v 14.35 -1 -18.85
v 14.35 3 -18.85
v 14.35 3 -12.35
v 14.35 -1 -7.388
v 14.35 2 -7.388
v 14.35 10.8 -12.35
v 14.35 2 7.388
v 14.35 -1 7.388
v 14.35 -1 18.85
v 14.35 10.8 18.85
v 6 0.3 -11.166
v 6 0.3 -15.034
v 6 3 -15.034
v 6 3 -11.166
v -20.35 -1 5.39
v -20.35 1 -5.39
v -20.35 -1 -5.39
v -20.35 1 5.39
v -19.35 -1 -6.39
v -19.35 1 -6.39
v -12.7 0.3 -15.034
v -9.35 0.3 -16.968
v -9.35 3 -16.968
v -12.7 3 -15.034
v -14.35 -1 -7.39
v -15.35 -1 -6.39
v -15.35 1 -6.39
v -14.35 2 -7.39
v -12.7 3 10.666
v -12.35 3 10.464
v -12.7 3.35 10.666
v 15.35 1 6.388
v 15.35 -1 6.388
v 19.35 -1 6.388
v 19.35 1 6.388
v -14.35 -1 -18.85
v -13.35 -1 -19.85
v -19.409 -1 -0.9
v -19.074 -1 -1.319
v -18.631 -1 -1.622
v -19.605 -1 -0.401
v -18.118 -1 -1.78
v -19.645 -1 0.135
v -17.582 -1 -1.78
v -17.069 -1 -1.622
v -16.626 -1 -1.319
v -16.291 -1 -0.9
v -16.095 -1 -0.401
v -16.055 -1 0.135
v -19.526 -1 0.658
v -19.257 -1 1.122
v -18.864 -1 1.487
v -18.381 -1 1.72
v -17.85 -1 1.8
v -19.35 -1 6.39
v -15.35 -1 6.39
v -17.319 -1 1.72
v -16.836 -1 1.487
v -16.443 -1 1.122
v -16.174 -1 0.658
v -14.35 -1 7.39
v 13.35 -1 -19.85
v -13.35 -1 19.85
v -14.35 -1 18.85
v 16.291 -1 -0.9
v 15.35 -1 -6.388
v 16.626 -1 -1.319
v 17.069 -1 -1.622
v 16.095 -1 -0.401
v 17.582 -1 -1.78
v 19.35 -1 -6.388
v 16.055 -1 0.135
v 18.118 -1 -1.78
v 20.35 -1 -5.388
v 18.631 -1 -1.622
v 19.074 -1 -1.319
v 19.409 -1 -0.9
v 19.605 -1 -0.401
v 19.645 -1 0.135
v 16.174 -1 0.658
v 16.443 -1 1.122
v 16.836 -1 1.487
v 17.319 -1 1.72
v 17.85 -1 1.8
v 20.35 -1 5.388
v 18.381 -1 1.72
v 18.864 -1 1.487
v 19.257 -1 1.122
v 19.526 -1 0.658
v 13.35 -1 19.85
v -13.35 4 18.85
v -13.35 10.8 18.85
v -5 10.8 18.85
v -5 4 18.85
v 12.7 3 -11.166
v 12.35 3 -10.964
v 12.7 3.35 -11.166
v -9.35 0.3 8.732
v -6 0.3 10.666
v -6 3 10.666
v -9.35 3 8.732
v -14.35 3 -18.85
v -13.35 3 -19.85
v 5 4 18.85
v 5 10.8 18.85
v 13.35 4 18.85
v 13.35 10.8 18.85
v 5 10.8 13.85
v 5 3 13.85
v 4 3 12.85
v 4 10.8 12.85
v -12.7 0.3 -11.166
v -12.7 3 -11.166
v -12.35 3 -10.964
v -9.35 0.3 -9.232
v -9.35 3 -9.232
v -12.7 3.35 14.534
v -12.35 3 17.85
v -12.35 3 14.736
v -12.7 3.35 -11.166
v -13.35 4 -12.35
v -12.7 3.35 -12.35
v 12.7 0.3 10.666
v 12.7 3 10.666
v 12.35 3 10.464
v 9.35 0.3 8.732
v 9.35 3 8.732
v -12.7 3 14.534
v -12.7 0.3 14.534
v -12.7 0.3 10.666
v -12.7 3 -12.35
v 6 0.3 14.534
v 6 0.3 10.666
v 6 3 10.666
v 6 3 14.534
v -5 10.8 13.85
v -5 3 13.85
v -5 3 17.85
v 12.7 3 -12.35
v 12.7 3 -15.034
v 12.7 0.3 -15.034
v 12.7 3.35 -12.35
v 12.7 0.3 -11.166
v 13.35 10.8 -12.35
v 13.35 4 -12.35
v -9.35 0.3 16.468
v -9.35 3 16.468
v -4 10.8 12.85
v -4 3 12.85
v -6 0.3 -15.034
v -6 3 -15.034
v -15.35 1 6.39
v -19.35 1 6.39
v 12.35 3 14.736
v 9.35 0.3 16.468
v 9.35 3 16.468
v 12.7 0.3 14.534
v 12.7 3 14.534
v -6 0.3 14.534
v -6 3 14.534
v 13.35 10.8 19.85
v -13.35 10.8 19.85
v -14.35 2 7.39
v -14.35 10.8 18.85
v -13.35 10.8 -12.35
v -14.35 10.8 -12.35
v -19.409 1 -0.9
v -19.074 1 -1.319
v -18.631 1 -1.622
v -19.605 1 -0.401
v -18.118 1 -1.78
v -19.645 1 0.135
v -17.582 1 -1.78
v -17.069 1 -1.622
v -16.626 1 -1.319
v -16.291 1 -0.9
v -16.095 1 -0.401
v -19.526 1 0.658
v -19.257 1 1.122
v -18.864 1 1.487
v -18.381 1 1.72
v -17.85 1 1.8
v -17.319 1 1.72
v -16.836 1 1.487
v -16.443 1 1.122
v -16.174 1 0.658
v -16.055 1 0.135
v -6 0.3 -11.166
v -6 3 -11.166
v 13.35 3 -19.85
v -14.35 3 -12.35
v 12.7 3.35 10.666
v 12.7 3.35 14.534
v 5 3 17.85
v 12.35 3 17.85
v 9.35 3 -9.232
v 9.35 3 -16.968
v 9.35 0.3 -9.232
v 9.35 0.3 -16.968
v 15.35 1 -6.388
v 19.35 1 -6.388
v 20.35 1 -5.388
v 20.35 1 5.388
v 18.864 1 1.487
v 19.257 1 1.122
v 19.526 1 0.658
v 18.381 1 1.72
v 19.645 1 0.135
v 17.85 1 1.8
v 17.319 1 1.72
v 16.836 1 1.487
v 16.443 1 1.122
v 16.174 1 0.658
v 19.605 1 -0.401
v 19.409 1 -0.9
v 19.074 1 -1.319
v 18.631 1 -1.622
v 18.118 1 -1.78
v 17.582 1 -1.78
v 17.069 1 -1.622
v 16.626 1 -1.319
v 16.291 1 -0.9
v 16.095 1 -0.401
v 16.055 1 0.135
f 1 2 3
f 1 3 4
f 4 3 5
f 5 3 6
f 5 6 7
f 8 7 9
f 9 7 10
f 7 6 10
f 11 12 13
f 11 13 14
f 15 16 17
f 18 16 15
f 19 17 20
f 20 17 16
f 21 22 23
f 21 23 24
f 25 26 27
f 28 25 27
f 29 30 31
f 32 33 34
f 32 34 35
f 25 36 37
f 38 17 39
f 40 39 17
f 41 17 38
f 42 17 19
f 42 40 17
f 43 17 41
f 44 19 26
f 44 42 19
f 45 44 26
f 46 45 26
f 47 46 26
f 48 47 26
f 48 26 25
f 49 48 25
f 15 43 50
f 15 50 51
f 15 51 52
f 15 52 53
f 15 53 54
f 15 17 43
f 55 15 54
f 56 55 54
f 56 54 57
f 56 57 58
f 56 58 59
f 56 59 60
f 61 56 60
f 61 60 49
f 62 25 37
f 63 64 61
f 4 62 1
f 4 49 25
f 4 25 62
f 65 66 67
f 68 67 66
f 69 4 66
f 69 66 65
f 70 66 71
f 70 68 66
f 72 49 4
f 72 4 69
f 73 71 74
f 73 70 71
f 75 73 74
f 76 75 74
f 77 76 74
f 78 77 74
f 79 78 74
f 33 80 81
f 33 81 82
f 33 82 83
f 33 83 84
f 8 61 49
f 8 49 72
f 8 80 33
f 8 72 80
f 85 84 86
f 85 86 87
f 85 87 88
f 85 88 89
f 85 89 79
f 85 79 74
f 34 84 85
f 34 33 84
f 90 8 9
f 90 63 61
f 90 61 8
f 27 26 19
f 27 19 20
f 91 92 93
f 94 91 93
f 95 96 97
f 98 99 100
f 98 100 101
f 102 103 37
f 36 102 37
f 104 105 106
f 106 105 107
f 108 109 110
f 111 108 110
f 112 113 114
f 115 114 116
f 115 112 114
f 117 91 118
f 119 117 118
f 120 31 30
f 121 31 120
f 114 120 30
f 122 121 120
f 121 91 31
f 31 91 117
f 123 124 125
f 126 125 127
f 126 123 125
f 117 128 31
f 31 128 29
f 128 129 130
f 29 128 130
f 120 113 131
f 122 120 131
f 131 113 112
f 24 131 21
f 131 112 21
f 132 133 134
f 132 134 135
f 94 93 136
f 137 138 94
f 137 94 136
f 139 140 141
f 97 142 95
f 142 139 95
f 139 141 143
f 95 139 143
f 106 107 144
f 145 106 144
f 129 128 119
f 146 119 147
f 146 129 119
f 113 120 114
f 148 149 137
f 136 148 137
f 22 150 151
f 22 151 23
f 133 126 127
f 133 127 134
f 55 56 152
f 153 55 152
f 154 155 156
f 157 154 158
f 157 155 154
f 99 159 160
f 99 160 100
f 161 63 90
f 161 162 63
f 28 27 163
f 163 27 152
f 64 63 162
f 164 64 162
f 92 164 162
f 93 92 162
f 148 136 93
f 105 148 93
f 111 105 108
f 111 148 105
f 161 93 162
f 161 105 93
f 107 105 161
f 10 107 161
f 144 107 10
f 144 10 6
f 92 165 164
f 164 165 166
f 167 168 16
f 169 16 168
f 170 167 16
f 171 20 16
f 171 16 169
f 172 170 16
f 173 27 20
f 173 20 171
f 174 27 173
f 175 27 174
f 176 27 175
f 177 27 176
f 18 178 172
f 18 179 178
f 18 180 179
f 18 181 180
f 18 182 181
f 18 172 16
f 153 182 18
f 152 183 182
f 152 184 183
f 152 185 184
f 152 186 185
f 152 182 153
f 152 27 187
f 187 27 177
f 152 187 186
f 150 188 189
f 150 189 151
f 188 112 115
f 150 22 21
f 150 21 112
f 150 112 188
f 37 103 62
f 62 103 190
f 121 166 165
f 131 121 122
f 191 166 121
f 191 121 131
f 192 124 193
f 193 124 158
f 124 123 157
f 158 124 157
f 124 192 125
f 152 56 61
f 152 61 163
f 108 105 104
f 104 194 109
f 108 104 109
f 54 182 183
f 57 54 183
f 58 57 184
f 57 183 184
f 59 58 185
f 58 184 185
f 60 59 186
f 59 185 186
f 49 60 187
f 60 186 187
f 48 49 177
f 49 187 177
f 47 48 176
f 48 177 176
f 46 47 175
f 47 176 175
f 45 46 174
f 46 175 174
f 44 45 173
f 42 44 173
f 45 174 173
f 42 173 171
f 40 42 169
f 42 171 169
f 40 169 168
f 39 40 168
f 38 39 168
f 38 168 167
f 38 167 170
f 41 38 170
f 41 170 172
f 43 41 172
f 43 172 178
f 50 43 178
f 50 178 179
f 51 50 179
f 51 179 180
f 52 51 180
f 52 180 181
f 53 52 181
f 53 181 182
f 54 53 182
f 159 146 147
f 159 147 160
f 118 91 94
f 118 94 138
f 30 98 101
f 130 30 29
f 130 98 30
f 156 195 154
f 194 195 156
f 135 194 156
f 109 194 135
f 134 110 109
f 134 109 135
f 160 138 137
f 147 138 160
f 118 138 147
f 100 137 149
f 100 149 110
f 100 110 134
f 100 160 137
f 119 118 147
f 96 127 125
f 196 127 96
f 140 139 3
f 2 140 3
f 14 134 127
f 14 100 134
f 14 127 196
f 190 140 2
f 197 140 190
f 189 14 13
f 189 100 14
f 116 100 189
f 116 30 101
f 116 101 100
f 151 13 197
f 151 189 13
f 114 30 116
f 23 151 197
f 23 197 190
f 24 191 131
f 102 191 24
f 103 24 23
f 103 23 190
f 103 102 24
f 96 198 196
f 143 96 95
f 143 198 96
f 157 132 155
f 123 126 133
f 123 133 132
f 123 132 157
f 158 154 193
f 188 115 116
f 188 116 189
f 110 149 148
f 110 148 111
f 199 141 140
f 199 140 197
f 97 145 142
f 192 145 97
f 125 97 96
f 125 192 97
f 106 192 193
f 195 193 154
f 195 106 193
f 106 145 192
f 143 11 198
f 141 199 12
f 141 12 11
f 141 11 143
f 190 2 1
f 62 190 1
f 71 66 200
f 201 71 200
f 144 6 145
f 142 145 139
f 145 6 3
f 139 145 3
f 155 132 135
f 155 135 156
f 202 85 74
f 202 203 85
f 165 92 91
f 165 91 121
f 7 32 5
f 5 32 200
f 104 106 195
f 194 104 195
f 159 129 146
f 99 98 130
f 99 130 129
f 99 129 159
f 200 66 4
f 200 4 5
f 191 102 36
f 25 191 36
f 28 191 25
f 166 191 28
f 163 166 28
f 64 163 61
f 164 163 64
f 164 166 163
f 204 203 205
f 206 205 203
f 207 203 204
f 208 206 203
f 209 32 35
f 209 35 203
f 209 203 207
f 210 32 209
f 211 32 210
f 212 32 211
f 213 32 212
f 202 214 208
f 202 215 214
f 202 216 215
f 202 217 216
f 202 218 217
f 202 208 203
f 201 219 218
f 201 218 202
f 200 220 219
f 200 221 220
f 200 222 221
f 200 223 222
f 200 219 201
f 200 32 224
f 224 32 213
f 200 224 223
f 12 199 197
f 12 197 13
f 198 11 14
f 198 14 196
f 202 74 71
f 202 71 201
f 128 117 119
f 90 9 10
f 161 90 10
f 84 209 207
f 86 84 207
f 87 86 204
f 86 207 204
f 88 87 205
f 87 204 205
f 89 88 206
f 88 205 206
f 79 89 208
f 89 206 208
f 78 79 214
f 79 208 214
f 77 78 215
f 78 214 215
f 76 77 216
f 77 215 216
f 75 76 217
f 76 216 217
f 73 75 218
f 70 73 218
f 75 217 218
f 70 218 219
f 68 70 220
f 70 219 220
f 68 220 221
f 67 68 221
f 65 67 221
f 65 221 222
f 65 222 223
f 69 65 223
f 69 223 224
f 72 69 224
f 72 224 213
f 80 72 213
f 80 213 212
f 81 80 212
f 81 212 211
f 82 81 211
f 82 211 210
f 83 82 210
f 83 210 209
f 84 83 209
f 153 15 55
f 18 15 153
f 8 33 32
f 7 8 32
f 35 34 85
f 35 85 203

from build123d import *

# Parameters (mm, degrees)
SKETCH2_W               = 28.7
SKETCH2_H               = 39.7
BOSS_EXTRUDE1_DEPTH     = 10.8
SKETCH3_W               = 26.7
SKETCH3_H               = 37.7
CUT_EXTRUDE1_DEPTH      = 7.8
CUT_EXTRUDE2_DEPTH      = 37.528790016
CUT_EXTRUDE2_DEPTH_BACK = 37.528790016
SKETCH4_W               = 7.5
SKETCH4_H               = 7.8
SKETCH6_W               = 28.7
SKETCH6_H               = 39.7
BOSS_EXTRUDE2_DEPTH     = 1
CUT_EXTRUDE3_DEPTH      = 26.705738659
CUT_EXTRUDE3_DEPTH_BACK = 2.7
SKETCH10_W              = 12.7769089
SKETCH10_H              = 2
BOSS_EXTRUDE3_DEPTH     = 6
SKETCH11_R              = 1.8
CUT_EXTRUDE4_DEPTH      = 31.069669104
SKETCH12_W              = 12.78
SKETCH12_H              = 2
BOSS_EXTRUDE4_DEPTH     = 6
SKETCH14_R              = 1.8
CUT_EXTRUDE5_DEPTH      = 31.069669104
CHAMFER1_SIZE           = 1
SKETCH16_W              = 10
SKETCH16_H              = 6
BOSS_EXTRUDE5_DEPTH     = 7.8
CHAMFER2_SIZE           = 1


with BuildPart() as part:
    # Sketch2 → Boss-Extrude1 (new body)
    with BuildSketch(Plane(origin=(0, 0, 0), x_dir=(1, 0, 0), z_dir=(0, 1, 0))):
        Rectangle(SKETCH2_W, SKETCH2_H)
    extrude(amount=BOSS_EXTRUDE1_DEPTH)

    # Sketch3 → Cut-Extrude1 (cut)
    with BuildSketch(Plane(origin=(0, 10.8, 0), x_dir=(1, 0, 0), z_dir=(0, 1, 0))):
        Rectangle(SKETCH3_W, SKETCH3_H)
    extrude(amount=-CUT_EXTRUDE1_DEPTH, mode=Mode.SUBTRACT)

    # Sketch4 → Cut-Extrude2 (cut, two sides: drawn at the far end of the back side and taken through both)
    with BuildSketch(Plane(origin=(14.35, 0, 0), x_dir=(0, 0, -1), z_dir=(1, 0, 0)).offset(-CUT_EXTRUDE2_DEPTH_BACK)):
        with Locations((16.1, 6.9)):
            Rectangle(SKETCH4_W, SKETCH4_H)
    extrude(amount=CUT_EXTRUDE2_DEPTH + CUT_EXTRUDE2_DEPTH_BACK, mode=Mode.SUBTRACT)

    # Sketch6 → Boss-Extrude2 (add)
    with BuildSketch(Plane.XZ):
        Rectangle(SKETCH6_W, SKETCH6_H)
    extrude(amount=BOSS_EXTRUDE2_DEPTH)

    # Sketch9 → Cut-Extrude3 (cut, two sides: drawn at the far end of the back side and taken through both)
    with BuildSketch(Plane(origin=(0, 3, 0), x_dir=(1, 0, 0), z_dir=(0, 1, 0)).offset(-CUT_EXTRUDE3_DEPTH_BACK)):
        Polygon((-9.35, -8.731753196), (-12.7, -10.665876598), (-12.7, -14.534123402), (-9.35, -16.468246804), (-6, -14.534123402), (-6, -10.665876598), align=None)
        Polygon((9.35, -8.731753196), (6, -10.665876598), (6, -14.534123402), (9.35, -16.468246804), (12.7, -14.534123402), (12.7, -10.665876598), align=None)
        Polygon((-9.35, 16.968246804), (-12.7, 15.034123402), (-12.7, 11.165876598), (-9.35, 9.231753196), (-6, 11.165876598), (-6, 15.034123402), align=None)
        Polygon((9.35, 16.968246804), (6, 15.034123402), (6, 11.165876598), (9.35, 9.231753196), (12.7, 11.165876598), (12.7, 15.034123402), align=None)
    extrude(amount=CUT_EXTRUDE3_DEPTH + CUT_EXTRUDE3_DEPTH_BACK, mode=Mode.SUBTRACT)

    # Sketch10 → Boss-Extrude3 (add)
    with BuildSketch(Plane(origin=(14.35, 0, 0), x_dir=(0, 0, -1), z_dir=(1, 0, 0))):
        Rectangle(SKETCH10_W, SKETCH10_H)
    extrude(amount=BOSS_EXTRUDE3_DEPTH)

    # Sketch11 → Cut-Extrude4 (cut, through all)
    with BuildSketch(Plane(origin=(0, 1, 0), x_dir=(1, 0, 0), z_dir=(0, 1, 0))):
        with Locations(Location((17.85, 0, 0), (0, 0, 270))):
            Circle(SKETCH11_R)
    extrude(amount=-CUT_EXTRUDE4_DEPTH, mode=Mode.SUBTRACT)

    # Sketch12 → Boss-Extrude4 (add)
    with BuildSketch(Plane.ZY.offset(14.35)):
        Rectangle(SKETCH12_W, SKETCH12_H)
    extrude(amount=BOSS_EXTRUDE4_DEPTH)

    # Sketch14 → Cut-Extrude5 (cut, through all)
    with BuildSketch(Plane(origin=(0, 1, 0), x_dir=(1, 0, 0), z_dir=(0, 1, 0))):
        with Locations(Location((-17.85, 0, 0), (0, 0, 270))):
            Circle(SKETCH14_R)
    extrude(amount=-CUT_EXTRUDE5_DEPTH, mode=Mode.SUBTRACT)

    # Chamfer1
    chamfer1_edges = [part.edges().sort_by_distance(p)[0] for p in [
        (14.35, 0, -6.38845445),
        (14.35, 1, 0),
        (14.35, 0, 6.38845445),
        (20.35, 0, -6.38845445),
        (20.35, 0, 6.38845445),
        (-14.35, 0, 6.39),
        (-14.35, 1, 0),
        (-14.35, 0, -6.39),
        (-20.35, 0, 6.39),
        (-20.35, 0, -6.39),
        (-14.35, 1, -19.85),
        (14.35, 1, -19.85),
        (14.35, 4.9, 19.85),
        (-14.35, 4.9, 19.85),
    ]]
    chamfer(chamfer1_edges, length=CHAMFER1_SIZE)

    # Sketch16 → Boss-Extrude5 (add)
    with BuildSketch(Plane(origin=(0, 3, 0), x_dir=(1, 0, 0), z_dir=(0, 1, 0))):
        with Locations((0, -15.85)):
            Rectangle(SKETCH16_W, SKETCH16_H)
    extrude(amount=BOSS_EXTRUDE5_DEPTH)

    # Chamfer2
    # the kernel refuses this chamfer: 1 mm, written as the material it adds along each edge
    with BuildSketch(Plane(origin=(13.35, 3, 18.85), x_dir=(0.027495876610585623, 0.9996219169112968, 0), z_dir=(0, 0, -1))) as chamfer2_piece_1_section:
        Polygon((CHAMFER2_SIZE * 0.999621916911, -CHAMFER2_SIZE * 0.0274958766106), (-CHAMFER2_SIZE * 0.0274958766106, -CHAMFER2_SIZE * 0.999621916911), (0, 0), align=None)
    chamfer2_piece_1 = extrude(amount=31.2, mode=Mode.PRIVATE)
    chamfer2_piece_1 = split(chamfer2_piece_1, bisect_by=Plane(origin=(12.111347434, 3.369117542, 14.873982119), z_dir=(0.500000000000001, 0, 0.8660254037844382)), keep=Keep.TOP, mode=Mode.PRIVATE)
    chamfer2_piece_1 = split(chamfer2_piece_1, bisect_by=Plane(origin=(12.7, 3.369117542, 16.577989782), z_dir=(1, 0, 0)), keep=Keep.TOP, mode=Mode.PRIVATE)
    add(chamfer2_piece_1)
    with BuildSketch(Plane(origin=(13.35, 3, 18.85), x_dir=(0.027495876610585623, 0.9996219169112968, 0), z_dir=(0, 0, -1))) as chamfer2_piece_2_section:
        Polygon((CHAMFER2_SIZE * 0.999621916911, -CHAMFER2_SIZE * 0.0274958766106), (-CHAMFER2_SIZE * 0.0274958766106, -CHAMFER2_SIZE * 0.999621916911), (0, 0), align=None)
    chamfer2_piece_2 = extrude(amount=31.2, mode=Mode.PRIVATE)
    chamfer2_piece_2 = split(chamfer2_piece_2, bisect_by=Plane(origin=(11.651023247, 3.093736145, 15.139750413), z_dir=(0.500000000000001, 0, 0.8660254037844382)), keep=Keep.TOP, mode=Mode.PRIVATE)
    chamfer2_piece_2 = split(chamfer2_piece_2, bisect_by=Plane(origin=(12.7, 3.093736145, 16.729857379), z_dir=(-1, 0, 0)), keep=Keep.TOP, mode=Mode.PRIVATE)
    add(chamfer2_piece_2)
    with BuildSketch(Plane(origin=(13.35, 3, 18.85), x_dir=(0.027495876610585623, 0.9996219169112968, 0), z_dir=(0, 0, -1))) as chamfer2_piece_3_section:
        Polygon((CHAMFER2_SIZE * 0.999621916911, -CHAMFER2_SIZE * 0.0274958766106), (-CHAMFER2_SIZE * 0.0274958766106, -CHAMFER2_SIZE * 0.999621916911), (0, 0), align=None)
    chamfer2_piece_3 = extrude(amount=31.2, mode=Mode.PRIVATE)
    chamfer2_piece_3 = split(chamfer2_piece_3, bisect_by=Plane(origin=(13.821591652, 3.360169767, 13.886572159), z_dir=(-0.500000000000001, 0, -0.8660254037844382)), keep=Keep.TOP, mode=Mode.PRIVATE)
    chamfer2_piece_3 = split(chamfer2_piece_3, bisect_by=Plane(origin=(13.821591652, 3.360169767, 11.313427841), z_dir=(-0.5000000000000001, 0, 0.8660254037844386)), keep=Keep.TOP, mode=Mode.PRIVATE)
    chamfer2_piece_3 = split(chamfer2_piece_3, bisect_by=Plane(origin=(12.7, 3.360169767, 12.6), z_dir=(1, 0, 0)), keep=Keep.TOP, mode=Mode.PRIVATE)
    add(chamfer2_piece_3)
    with BuildSketch(Plane(origin=(13.35, 3, 18.85), x_dir=(0.027495876610585623, 0.9996219169112968, 0), z_dir=(0, 0, -1))) as chamfer2_piece_4_section:
        Polygon((CHAMFER2_SIZE * 0.999621916911, -CHAMFER2_SIZE * 0.0274958766106), (-CHAMFER2_SIZE * 0.0274958766106, -CHAMFER2_SIZE * 0.999621916911), (0, 0), align=None)
    chamfer2_piece_4 = extrude(amount=31.2, mode=Mode.PRIVATE)
    chamfer2_piece_4 = split(chamfer2_piece_4, bisect_by=Plane(origin=(8.267666364, 3.367668541, 8.10686758), z_dir=(0.5000000000000001, 0, -0.8660254037844386)), keep=Keep.TOP, mode=Mode.PRIVATE)
    chamfer2_piece_4 = split(chamfer2_piece_4, bisect_by=Plane(origin=(12.7, 3.367668541, -0.25), z_dir=(1, 0, 0)), keep=Keep.TOP, mode=Mode.PRIVATE)
    chamfer2_piece_4 = split(chamfer2_piece_4, bisect_by=Plane(origin=(8.267666364, 3.367668541, -8.60686758), z_dir=(0.5000000000000003, 0, 0.8660254037844387)), keep=Keep.TOP, mode=Mode.PRIVATE)
    add(chamfer2_piece_4)
    with BuildSketch(Plane(origin=(13.35, 3, 18.85), x_dir=(0.027495876610585623, 0.9996219169112968, 0), z_dir=(0, 0, -1))) as chamfer2_piece_5_section:
        Polygon((CHAMFER2_SIZE * 0.999621916911, -CHAMFER2_SIZE * 0.0274958766106), (-CHAMFER2_SIZE * 0.0274958766106, -CHAMFER2_SIZE * 0.999621916911), (0, 0), align=None)
    chamfer2_piece_5 = extrude(amount=31.2, mode=Mode.PRIVATE)
    chamfer2_piece_5 = split(chamfer2_piece_5, bisect_by=Plane(origin=(7.874549458, 3.093354027, 7.879901429), z_dir=(0.5000000000000001, 0, -0.8660254037844386)), keep=Keep.TOP, mode=Mode.PRIVATE)
    chamfer2_piece_5 = split(chamfer2_piece_5, bisect_by=Plane(origin=(12.7, 3.093354027, -0.25), z_dir=(-1, 0, 0)), keep=Keep.TOP, mode=Mode.PRIVATE)
    chamfer2_piece_5 = split(chamfer2_piece_5, bisect_by=Plane(origin=(7.874549458, 3.093354027, -8.379901429), z_dir=(0.5000000000000003, 0, 0.8660254037844387)), keep=Keep.TOP, mode=Mode.PRIVATE)
    add(chamfer2_piece_5)
    with BuildSketch(Plane(origin=(13.35, 3, 18.85), x_dir=(0.027495876610585623, 0.9996219169112968, 0), z_dir=(0, 0, -1))) as chamfer2_piece_6_section:
        Polygon((CHAMFER2_SIZE * 0.999621916911, -CHAMFER2_SIZE * 0.0274958766106), (-CHAMFER2_SIZE * 0.0274958766106, -CHAMFER2_SIZE * 0.999621916911), (0, 0), align=None)
    chamfer2_piece_6 = extrude(amount=31.2, mode=Mode.PRIVATE)
    chamfer2_piece_6 = split(chamfer2_piece_6, bisect_by=Plane(origin=(12.7, 3.355082682, -11.864598925), z_dir=(1, 0, 0)), keep=Keep.TOP, mode=Mode.PRIVATE)
    chamfer2_piece_6 = split(chamfer2_piece_6, bisect_by=Plane(origin=(13.279668077, 3.355082682, -11.500548118), z_dir=(-0.5000000000000003, 0, -0.8660254037844387)), keep=Keep.TOP, mode=Mode.PRIVATE)
    add(chamfer2_piece_6)
    with BuildSketch(Plane(origin=(-13.35, 3, 18.85), x_dir=(0, 0.9996219169112968, 0.027495876610585623), z_dir=(1, 0, 0)), Plane(origin=(2.428317012, 3, 18.85), x_dir=(0, 0.9996219169112968, 0.027495876610585623), z_dir=(1, 0, 0))) as chamfer2_piece_7:
        Polygon((CHAMFER2_SIZE * 0.999621916911, -CHAMFER2_SIZE * 0.0274958766106), (-CHAMFER2_SIZE * 0.0274958766106, -CHAMFER2_SIZE * 0.999621916911), (0, 0), align=None)
    extrude(amount=10.921682988)
    with BuildSketch(Plane(origin=(-13.35, 3, -12.35), x_dir=(-0.027495876610585623, 0.9996219169112968, 0), z_dir=(0, 0, 1))) as chamfer2_piece_8_section:
        Polygon((CHAMFER2_SIZE * 0.999621916911, -CHAMFER2_SIZE * 0.0274958766106), (-CHAMFER2_SIZE * 0.0274958766106, -CHAMFER2_SIZE * 0.999621916911), (0, 0), align=None)
    chamfer2_piece_8 = extrude(amount=31.2, mode=Mode.PRIVATE)
    chamfer2_piece_8 = split(chamfer2_piece_8, bisect_by=Plane(origin=(-12.7, 3.355082682, -11.864598925), z_dir=(-1, 0, 0)), keep=Keep.TOP, mode=Mode.PRIVATE)
    chamfer2_piece_8 = split(chamfer2_piece_8, bisect_by=Plane(origin=(-13.279668077, 3.355082682, -11.500548118), z_dir=(0.5000000000000003, 0, -0.8660254037844387)), keep=Keep.TOP, mode=Mode.PRIVATE)
    add(chamfer2_piece_8)
    with BuildSketch(Plane(origin=(-13.35, 3, -12.35), x_dir=(-0.027495876610585623, 0.9996219169112968, 0), z_dir=(0, 0, 1))) as chamfer2_piece_9_section:
        Polygon((CHAMFER2_SIZE * 0.999621916911, -CHAMFER2_SIZE * 0.0274958766106), (-CHAMFER2_SIZE * 0.0274958766106, -CHAMFER2_SIZE * 0.999621916911), (0, 0), align=None)
    chamfer2_piece_9 = extrude(amount=31.2, mode=Mode.PRIVATE)
    chamfer2_piece_9 = split(chamfer2_piece_9, bisect_by=Plane(origin=(-12.7, 3.367668541, -0.25), z_dir=(-1, 0, 0)), keep=Keep.TOP, mode=Mode.PRIVATE)
    chamfer2_piece_9 = split(chamfer2_piece_9, bisect_by=Plane(origin=(-8.267666364, 3.367668541, 8.10686758), z_dir=(-0.49999999999999967, 0, -0.8660254037844389)), keep=Keep.TOP, mode=Mode.PRIVATE)
    chamfer2_piece_9 = split(chamfer2_piece_9, bisect_by=Plane(origin=(-8.267666364, 3.367668541, -8.60686758), z_dir=(-0.5000000000000003, 0, 0.8660254037844387)), keep=Keep.TOP, mode=Mode.PRIVATE)
    add(chamfer2_piece_9)
    with BuildSketch(Plane(origin=(-13.35, 3, -12.35), x_dir=(-0.027495876610585623, 0.9996219169112968, 0), z_dir=(0, 0, 1))) as chamfer2_piece_10_section:
        Polygon((CHAMFER2_SIZE * 0.999621916911, -CHAMFER2_SIZE * 0.0274958766106), (-CHAMFER2_SIZE * 0.0274958766106, -CHAMFER2_SIZE * 0.999621916911), (0, 0), align=None)
    chamfer2_piece_10 = extrude(amount=31.2, mode=Mode.PRIVATE)
    chamfer2_piece_10 = split(chamfer2_piece_10, bisect_by=Plane(origin=(-12.7, 3.093354027, -0.25), z_dir=(1, 0, 0)), keep=Keep.TOP, mode=Mode.PRIVATE)
    chamfer2_piece_10 = split(chamfer2_piece_10, bisect_by=Plane(origin=(-7.874549458, 3.093354027, 7.879901429), z_dir=(-0.49999999999999967, 0, -0.8660254037844389)), keep=Keep.TOP, mode=Mode.PRIVATE)
    chamfer2_piece_10 = split(chamfer2_piece_10, bisect_by=Plane(origin=(-7.874549458, 3.093354027, -8.379901429), z_dir=(-0.5000000000000003, 0, 0.8660254037844387)), keep=Keep.TOP, mode=Mode.PRIVATE)
    add(chamfer2_piece_10)
    with BuildSketch(Plane(origin=(-13.35, 3, -12.35), x_dir=(-0.027495876610585623, 0.9996219169112968, 0), z_dir=(0, 0, 1))) as chamfer2_piece_11_section:
        Polygon((CHAMFER2_SIZE * 0.999621916911, -CHAMFER2_SIZE * 0.0274958766106), (-CHAMFER2_SIZE * 0.0274958766106, -CHAMFER2_SIZE * 0.999621916911), (0, 0), align=None)
    chamfer2_piece_11 = extrude(amount=31.2, mode=Mode.PRIVATE)
    chamfer2_piece_11 = split(chamfer2_piece_11, bisect_by=Plane(origin=(-12.7, 3.360169767, 12.6), z_dir=(-1, 0, 0)), keep=Keep.TOP, mode=Mode.PRIVATE)
    chamfer2_piece_11 = split(chamfer2_piece_11, bisect_by=Plane(origin=(-13.821591652, 3.360169767, 13.886572159), z_dir=(0.4999999999999996, 0, -0.8660254037844389)), keep=Keep.TOP, mode=Mode.PRIVATE)
    chamfer2_piece_11 = split(chamfer2_piece_11, bisect_by=Plane(origin=(-13.821591652, 3.360169767, 11.313427841), z_dir=(0.49999999999999967, 0, 0.8660254037844389)), keep=Keep.TOP, mode=Mode.PRIVATE)
    add(chamfer2_piece_11)
    with BuildSketch(Plane(origin=(-13.35, 3, -12.35), x_dir=(-0.027495876610585623, 0.9996219169112968, 0), z_dir=(0, 0, 1))) as chamfer2_piece_12_section:
        Polygon((CHAMFER2_SIZE * 0.999621916911, -CHAMFER2_SIZE * 0.0274958766106), (-CHAMFER2_SIZE * 0.0274958766106, -CHAMFER2_SIZE * 0.999621916911), (0, 0), align=None)
    chamfer2_piece_12 = extrude(amount=31.2, mode=Mode.PRIVATE)
    chamfer2_piece_12 = split(chamfer2_piece_12, bisect_by=Plane(origin=(-12.7, 3.369117542, 16.577989782), z_dir=(-1, 0, 0)), keep=Keep.TOP, mode=Mode.PRIVATE)
    chamfer2_piece_12 = split(chamfer2_piece_12, bisect_by=Plane(origin=(-12.111347434, 3.369117542, 14.873982119), z_dir=(-0.4999999999999996, 0, 0.8660254037844389)), keep=Keep.TOP, mode=Mode.PRIVATE)
    add(chamfer2_piece_12)
    with BuildSketch(Plane(origin=(-13.35, 3, -12.35), x_dir=(-0.027495876610585623, 0.9996219169112968, 0), z_dir=(0, 0, 1))) as chamfer2_piece_13_section:
        Polygon((CHAMFER2_SIZE * 0.999621916911, -CHAMFER2_SIZE * 0.0274958766106), (-CHAMFER2_SIZE * 0.0274958766106, -CHAMFER2_SIZE * 0.999621916911), (0, 0), align=None)
    chamfer2_piece_13 = extrude(amount=31.2, mode=Mode.PRIVATE)
    chamfer2_piece_13 = split(chamfer2_piece_13, bisect_by=Plane(origin=(-12.7, 3.093736145, 16.729857379), z_dir=(1, 0, 0)), keep=Keep.TOP, mode=Mode.PRIVATE)
    chamfer2_piece_13 = split(chamfer2_piece_13, bisect_by=Plane(origin=(-11.651023247, 3.093736145, 15.139750413), z_dir=(-0.4999999999999996, 0, 0.8660254037844389)), keep=Keep.TOP, mode=Mode.PRIVATE)
    add(chamfer2_piece_13)
    # the kernel refuses this chamfer: 1 mm, written as the material it takes off along each edge
    with BuildSketch(Plane(origin=(-5, 3, 12.85), x_dir=(0.9996219169112968, 0, -0.027495876610585623), z_dir=(0, 1, 0)), Plane(origin=(5, 3, 12.85), x_dir=(0.02749587661058651, 0, 0.9996219169112968), z_dir=(0, 1, 0))) as chamfer2_2_piece_1:
        Polygon((CHAMFER2_SIZE * 0.999621916911, -CHAMFER2_SIZE * 0.0274958766106), (-CHAMFER2_SIZE * 0.0274958766106, -CHAMFER2_SIZE * 0.999621916911), (0, 0), align=None)
    extrude(amount=10.371682988, mode=Mode.SUBTRACT)


solid = part.part
